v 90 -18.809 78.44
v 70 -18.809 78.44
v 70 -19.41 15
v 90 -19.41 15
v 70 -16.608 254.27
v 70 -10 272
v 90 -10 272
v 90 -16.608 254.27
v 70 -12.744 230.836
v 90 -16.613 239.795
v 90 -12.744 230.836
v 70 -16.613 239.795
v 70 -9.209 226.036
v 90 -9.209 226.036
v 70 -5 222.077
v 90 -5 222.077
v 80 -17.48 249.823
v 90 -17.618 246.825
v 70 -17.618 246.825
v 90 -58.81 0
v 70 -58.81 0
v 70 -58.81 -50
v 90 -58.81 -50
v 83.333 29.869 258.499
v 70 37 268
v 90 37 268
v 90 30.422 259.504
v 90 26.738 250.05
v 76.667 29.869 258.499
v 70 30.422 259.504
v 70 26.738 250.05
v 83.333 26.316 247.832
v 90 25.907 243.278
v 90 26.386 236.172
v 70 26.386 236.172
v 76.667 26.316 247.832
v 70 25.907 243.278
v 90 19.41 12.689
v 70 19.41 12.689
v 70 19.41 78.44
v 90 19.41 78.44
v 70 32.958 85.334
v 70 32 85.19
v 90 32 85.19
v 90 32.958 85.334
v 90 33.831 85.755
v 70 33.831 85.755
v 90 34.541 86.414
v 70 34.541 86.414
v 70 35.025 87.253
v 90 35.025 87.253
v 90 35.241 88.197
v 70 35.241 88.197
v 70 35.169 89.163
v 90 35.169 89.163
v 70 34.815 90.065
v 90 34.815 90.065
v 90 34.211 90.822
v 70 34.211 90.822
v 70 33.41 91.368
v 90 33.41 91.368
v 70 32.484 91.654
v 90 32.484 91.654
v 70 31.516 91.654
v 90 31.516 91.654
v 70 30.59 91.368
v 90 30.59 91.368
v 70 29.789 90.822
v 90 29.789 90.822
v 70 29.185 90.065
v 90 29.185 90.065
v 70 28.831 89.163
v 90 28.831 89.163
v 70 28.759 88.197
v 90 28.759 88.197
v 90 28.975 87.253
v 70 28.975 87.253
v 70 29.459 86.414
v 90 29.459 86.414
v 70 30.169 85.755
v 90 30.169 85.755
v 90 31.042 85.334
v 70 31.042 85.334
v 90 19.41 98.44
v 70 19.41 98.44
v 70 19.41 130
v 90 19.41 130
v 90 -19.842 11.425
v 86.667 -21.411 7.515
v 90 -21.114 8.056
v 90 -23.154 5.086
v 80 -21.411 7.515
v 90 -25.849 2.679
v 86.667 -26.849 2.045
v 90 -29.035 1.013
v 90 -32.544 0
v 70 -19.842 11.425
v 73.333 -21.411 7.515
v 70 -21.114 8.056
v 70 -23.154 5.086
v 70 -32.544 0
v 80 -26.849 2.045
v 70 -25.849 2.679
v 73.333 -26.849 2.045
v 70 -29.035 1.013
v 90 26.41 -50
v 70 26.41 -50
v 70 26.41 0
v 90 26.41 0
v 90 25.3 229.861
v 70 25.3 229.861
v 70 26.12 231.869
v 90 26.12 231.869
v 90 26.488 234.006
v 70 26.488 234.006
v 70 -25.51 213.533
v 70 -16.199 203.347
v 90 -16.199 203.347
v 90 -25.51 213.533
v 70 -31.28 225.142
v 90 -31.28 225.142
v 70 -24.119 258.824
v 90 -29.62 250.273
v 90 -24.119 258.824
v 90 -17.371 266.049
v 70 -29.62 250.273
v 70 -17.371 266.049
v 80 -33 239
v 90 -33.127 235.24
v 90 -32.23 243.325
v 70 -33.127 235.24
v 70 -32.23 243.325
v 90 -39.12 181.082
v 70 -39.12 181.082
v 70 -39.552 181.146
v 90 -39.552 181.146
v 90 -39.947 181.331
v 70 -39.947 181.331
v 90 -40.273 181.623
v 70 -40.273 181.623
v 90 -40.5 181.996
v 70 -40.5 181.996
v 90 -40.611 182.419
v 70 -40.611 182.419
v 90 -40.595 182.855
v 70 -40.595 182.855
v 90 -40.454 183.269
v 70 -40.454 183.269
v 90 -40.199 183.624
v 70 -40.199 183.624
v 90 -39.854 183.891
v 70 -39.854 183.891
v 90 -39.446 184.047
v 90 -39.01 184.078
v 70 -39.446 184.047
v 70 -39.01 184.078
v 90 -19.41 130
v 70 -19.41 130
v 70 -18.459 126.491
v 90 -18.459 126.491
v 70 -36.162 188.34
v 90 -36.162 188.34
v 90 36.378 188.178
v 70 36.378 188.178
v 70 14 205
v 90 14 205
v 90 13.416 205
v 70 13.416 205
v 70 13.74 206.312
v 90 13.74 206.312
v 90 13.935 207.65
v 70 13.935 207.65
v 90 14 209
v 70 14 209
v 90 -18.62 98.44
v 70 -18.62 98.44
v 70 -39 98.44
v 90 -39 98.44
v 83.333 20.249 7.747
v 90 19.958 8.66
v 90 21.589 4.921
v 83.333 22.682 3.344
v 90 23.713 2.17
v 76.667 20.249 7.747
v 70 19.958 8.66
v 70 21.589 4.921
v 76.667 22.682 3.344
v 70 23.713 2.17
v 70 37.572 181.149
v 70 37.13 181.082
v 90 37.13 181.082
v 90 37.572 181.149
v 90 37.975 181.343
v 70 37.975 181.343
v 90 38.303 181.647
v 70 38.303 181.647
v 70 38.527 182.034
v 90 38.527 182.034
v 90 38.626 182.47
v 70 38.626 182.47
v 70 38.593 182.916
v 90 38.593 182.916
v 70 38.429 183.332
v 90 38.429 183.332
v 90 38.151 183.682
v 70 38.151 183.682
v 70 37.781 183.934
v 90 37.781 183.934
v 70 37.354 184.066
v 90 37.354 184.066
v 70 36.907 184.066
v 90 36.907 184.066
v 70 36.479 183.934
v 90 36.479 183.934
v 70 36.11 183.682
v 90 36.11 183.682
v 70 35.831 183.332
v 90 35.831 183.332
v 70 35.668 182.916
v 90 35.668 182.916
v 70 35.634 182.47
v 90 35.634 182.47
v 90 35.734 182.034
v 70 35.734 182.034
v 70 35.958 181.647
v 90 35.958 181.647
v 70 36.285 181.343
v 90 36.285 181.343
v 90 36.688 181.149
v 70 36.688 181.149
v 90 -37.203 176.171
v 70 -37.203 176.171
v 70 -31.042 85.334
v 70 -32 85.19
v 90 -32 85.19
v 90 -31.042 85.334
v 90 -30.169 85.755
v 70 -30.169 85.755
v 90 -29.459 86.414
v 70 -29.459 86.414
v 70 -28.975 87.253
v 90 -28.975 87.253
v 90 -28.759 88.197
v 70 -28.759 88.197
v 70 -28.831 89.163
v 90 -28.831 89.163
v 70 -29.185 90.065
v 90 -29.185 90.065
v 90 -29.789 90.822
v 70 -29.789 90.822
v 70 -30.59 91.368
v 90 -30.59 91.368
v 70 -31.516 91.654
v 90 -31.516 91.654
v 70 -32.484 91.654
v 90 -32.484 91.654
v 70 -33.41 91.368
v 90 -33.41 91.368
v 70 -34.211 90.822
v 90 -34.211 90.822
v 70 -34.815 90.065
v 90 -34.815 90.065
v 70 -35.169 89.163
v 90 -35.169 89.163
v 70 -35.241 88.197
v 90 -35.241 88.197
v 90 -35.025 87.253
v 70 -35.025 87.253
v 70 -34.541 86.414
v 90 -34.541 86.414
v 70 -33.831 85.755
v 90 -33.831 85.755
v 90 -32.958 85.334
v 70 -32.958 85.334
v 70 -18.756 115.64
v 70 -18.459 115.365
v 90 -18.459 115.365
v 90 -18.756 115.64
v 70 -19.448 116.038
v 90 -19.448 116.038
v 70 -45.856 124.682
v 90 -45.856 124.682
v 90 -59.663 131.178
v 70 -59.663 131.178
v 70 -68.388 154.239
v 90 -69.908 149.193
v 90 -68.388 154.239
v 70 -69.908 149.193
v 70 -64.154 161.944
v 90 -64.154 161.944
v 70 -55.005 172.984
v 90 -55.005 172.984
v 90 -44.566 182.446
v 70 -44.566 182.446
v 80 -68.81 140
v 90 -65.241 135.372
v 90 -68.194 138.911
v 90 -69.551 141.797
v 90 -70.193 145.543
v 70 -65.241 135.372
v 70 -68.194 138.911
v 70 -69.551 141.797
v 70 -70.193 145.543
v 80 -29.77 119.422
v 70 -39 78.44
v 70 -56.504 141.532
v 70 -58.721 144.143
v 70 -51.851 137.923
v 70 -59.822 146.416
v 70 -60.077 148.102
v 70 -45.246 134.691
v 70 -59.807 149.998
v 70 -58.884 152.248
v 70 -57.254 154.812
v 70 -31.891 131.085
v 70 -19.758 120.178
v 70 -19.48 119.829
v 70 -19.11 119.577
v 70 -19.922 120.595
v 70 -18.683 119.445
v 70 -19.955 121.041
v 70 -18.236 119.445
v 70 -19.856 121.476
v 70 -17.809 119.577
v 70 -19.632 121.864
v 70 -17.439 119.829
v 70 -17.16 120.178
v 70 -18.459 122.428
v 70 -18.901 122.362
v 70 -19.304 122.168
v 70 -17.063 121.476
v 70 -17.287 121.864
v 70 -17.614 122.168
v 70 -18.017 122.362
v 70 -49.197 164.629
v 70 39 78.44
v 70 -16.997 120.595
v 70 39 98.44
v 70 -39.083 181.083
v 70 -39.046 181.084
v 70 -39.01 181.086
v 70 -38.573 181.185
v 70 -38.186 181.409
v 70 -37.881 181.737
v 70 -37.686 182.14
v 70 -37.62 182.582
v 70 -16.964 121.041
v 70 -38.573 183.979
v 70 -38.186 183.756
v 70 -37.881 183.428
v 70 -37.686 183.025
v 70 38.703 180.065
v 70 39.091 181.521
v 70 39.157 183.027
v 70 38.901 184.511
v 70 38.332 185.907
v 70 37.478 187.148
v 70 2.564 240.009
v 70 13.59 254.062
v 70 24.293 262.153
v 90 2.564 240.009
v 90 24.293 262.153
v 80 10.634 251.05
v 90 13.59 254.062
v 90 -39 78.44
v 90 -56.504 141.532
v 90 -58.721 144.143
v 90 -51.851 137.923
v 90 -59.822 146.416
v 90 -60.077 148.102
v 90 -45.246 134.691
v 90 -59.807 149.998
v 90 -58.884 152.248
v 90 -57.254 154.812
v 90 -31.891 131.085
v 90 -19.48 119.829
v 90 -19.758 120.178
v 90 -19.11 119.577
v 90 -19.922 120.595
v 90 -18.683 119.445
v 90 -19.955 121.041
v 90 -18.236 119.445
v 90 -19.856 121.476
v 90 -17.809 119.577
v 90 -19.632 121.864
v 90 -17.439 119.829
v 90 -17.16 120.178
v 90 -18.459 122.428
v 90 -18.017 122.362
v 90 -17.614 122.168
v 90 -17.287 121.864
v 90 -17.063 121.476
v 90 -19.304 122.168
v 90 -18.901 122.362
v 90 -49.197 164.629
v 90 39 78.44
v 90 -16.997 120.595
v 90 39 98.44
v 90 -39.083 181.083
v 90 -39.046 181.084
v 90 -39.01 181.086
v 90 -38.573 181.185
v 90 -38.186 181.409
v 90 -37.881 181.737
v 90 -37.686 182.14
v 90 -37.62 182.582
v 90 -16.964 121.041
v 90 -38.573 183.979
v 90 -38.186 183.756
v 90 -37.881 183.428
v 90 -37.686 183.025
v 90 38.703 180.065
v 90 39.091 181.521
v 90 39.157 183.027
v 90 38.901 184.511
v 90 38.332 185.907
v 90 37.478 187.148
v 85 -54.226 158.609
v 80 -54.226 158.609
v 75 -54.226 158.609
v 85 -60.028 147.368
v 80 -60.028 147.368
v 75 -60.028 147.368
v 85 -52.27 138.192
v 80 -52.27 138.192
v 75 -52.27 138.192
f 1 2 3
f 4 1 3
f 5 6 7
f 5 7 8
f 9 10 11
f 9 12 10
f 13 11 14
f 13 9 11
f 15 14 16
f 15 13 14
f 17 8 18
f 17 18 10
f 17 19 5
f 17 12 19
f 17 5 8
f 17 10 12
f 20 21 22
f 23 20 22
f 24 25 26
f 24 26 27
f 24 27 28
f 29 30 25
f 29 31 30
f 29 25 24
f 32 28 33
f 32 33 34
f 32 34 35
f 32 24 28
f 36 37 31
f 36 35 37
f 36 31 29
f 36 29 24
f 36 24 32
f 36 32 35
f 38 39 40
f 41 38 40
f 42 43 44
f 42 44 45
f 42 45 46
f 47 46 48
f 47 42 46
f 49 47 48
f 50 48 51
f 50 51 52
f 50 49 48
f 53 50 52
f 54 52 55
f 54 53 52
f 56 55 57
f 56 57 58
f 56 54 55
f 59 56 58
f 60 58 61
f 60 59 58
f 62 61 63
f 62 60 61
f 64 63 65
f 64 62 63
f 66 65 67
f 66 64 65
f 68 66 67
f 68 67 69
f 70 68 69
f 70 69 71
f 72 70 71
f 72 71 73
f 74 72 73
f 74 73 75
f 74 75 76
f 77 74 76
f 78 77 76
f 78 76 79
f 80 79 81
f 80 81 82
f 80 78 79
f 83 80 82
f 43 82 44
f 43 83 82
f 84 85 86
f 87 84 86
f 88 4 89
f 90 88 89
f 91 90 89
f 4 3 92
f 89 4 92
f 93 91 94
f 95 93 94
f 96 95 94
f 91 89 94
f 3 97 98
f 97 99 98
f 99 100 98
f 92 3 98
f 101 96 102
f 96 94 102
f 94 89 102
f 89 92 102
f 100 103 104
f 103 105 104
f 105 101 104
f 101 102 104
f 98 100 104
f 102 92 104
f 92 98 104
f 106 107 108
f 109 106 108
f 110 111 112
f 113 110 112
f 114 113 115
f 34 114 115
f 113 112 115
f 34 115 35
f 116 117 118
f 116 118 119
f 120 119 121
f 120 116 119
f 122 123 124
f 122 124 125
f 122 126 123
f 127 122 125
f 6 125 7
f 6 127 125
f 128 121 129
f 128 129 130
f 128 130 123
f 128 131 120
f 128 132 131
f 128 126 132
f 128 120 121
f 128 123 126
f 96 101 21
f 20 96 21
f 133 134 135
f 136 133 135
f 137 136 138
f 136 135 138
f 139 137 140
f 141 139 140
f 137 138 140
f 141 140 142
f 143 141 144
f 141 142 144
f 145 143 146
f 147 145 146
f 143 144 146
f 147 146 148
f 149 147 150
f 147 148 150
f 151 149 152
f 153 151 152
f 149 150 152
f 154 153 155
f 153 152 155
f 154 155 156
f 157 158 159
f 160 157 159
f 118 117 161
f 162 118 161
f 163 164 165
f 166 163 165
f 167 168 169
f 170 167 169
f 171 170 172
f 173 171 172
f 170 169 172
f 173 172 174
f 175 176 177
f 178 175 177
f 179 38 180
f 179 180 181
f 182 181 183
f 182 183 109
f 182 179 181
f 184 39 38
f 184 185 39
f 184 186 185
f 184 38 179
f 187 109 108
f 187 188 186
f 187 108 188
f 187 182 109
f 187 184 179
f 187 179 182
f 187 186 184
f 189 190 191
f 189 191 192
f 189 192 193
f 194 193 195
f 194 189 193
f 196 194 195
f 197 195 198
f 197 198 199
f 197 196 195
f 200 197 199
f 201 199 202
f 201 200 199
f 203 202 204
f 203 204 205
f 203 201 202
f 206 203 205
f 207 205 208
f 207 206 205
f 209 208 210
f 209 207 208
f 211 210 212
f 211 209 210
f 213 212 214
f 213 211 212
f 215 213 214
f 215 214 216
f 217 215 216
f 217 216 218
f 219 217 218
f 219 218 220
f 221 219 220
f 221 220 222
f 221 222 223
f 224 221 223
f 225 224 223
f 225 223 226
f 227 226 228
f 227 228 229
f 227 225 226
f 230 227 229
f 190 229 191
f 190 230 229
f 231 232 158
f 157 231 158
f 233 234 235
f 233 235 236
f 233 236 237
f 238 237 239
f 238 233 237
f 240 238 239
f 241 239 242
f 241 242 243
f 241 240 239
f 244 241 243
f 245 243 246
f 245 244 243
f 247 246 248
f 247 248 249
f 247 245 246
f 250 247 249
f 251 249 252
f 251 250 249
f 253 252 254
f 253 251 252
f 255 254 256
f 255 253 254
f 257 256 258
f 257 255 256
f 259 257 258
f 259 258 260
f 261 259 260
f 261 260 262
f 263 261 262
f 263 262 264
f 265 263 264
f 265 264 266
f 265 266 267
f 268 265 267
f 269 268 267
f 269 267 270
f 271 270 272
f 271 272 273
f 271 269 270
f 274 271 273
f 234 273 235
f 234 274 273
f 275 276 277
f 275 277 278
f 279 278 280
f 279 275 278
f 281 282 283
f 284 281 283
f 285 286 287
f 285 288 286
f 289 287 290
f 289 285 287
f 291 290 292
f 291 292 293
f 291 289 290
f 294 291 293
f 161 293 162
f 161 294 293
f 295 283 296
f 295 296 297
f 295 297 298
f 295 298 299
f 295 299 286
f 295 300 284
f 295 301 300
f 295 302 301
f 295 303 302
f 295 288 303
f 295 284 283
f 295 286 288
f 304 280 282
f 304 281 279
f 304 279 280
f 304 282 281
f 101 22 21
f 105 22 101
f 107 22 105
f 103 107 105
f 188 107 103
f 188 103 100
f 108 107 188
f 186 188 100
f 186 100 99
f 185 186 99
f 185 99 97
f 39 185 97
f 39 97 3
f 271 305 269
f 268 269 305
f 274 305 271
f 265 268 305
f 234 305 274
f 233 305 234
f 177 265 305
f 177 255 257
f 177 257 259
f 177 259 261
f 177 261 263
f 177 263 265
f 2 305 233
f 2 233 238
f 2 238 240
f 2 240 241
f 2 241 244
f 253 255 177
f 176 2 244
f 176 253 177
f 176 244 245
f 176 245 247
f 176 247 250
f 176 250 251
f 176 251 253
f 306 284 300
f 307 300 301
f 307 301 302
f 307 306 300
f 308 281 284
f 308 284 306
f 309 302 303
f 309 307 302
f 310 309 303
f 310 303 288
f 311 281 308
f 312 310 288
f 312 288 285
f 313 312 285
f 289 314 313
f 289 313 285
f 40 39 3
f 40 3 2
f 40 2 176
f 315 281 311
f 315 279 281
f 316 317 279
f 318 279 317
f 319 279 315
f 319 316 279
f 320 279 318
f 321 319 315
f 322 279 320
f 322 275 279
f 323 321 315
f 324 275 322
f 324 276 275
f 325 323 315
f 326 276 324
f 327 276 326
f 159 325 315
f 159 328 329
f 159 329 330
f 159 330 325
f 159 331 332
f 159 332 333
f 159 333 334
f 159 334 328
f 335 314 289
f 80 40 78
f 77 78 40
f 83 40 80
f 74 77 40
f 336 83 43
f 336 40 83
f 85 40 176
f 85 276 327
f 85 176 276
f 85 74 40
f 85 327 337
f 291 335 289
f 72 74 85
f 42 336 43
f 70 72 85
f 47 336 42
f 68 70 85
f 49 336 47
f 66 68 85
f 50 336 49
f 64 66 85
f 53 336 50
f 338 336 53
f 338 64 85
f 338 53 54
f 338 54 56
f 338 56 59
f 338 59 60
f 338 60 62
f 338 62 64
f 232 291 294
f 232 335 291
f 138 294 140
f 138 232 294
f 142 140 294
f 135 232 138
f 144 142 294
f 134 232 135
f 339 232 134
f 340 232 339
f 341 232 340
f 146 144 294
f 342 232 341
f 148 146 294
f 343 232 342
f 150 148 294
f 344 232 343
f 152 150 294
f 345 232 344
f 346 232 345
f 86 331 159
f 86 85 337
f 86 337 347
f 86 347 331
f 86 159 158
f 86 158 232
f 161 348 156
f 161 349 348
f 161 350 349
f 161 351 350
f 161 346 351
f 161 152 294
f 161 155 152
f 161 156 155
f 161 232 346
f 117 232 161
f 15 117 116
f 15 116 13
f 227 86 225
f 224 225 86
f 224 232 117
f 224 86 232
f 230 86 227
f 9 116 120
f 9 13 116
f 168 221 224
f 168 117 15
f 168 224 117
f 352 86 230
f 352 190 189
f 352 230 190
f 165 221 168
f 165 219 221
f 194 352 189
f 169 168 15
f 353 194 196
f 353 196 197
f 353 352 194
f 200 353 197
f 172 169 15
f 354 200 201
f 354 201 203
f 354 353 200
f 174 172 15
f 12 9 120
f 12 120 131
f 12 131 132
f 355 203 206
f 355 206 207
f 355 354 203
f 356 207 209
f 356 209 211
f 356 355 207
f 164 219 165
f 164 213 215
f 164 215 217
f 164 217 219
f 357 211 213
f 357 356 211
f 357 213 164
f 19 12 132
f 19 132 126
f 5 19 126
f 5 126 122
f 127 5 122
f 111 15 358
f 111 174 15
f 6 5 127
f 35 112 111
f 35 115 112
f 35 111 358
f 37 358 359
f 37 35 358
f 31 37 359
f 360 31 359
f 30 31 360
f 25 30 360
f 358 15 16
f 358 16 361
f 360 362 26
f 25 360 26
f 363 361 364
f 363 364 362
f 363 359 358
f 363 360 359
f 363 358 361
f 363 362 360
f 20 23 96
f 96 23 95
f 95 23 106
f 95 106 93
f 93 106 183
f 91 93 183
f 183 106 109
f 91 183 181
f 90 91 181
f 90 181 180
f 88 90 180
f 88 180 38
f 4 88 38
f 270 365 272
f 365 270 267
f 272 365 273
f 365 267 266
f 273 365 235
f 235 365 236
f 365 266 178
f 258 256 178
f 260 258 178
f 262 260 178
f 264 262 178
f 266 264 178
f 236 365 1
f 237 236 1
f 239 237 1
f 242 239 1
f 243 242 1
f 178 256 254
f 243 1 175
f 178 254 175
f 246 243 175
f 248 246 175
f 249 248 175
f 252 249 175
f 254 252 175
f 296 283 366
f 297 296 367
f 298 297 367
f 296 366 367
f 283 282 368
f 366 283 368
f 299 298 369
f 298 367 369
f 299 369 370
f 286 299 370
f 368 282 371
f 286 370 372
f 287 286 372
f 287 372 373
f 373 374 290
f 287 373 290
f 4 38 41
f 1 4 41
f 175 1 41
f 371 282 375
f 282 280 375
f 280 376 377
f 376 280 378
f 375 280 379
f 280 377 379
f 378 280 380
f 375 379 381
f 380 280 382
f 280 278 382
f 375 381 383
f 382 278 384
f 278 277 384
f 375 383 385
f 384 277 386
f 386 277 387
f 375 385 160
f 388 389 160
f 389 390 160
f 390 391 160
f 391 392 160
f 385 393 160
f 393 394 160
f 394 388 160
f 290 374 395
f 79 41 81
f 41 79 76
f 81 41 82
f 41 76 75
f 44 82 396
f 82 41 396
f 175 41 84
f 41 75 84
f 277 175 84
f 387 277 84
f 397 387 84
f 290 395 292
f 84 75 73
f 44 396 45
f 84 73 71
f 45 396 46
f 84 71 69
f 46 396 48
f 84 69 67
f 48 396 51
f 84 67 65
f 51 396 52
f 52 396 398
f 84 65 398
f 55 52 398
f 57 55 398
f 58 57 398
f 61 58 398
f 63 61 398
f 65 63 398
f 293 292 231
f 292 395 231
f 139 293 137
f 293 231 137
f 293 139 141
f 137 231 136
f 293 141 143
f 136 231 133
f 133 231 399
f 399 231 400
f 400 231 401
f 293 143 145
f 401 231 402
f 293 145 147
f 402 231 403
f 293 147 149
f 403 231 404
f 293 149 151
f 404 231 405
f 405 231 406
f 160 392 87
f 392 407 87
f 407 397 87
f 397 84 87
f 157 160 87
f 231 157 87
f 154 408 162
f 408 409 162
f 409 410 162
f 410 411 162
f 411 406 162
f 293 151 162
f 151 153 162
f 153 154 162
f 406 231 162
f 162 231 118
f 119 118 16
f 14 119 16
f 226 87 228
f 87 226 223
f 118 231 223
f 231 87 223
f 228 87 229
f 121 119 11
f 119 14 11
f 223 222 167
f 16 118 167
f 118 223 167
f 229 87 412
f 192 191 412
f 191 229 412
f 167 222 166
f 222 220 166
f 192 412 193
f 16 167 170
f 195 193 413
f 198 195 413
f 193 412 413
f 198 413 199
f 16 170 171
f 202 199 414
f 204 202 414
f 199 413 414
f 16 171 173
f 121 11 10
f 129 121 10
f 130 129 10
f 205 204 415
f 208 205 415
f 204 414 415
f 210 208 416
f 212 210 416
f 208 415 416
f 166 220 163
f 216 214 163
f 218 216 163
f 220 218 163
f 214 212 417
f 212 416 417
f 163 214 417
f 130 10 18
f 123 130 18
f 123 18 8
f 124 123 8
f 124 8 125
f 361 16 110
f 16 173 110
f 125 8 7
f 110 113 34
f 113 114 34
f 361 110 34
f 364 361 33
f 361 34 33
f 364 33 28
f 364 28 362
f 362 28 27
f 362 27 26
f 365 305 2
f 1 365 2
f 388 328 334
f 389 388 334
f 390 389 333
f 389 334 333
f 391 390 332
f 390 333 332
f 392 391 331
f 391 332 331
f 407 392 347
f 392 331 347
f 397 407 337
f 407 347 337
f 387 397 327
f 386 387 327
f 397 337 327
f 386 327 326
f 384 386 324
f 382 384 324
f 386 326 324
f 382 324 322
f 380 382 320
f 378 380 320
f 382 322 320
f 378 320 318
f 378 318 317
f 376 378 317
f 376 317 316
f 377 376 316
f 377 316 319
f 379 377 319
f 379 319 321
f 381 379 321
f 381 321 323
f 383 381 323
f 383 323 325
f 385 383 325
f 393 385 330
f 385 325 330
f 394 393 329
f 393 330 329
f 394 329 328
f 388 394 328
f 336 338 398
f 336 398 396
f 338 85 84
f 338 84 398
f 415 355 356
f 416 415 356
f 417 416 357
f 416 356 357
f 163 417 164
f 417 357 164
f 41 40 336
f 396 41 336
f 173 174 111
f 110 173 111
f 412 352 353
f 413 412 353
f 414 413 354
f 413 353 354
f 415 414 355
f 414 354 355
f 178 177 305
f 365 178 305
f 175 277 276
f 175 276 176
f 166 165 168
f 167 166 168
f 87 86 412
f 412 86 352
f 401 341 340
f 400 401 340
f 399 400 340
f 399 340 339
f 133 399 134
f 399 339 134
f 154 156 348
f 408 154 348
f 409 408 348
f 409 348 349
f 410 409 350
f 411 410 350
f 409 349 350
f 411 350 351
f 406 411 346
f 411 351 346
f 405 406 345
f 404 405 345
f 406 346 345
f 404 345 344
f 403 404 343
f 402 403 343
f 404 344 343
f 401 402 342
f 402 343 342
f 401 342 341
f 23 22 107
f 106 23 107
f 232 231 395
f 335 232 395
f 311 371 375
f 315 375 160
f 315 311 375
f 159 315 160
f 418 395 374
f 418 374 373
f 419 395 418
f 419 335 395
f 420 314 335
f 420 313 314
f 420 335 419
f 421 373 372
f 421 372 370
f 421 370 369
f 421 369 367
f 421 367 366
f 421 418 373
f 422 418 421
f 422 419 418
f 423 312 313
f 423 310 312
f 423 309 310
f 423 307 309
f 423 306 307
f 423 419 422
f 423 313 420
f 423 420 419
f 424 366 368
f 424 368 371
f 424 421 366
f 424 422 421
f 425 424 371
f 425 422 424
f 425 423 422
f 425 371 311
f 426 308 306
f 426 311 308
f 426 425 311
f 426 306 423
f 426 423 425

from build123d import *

# Parameters (mm, degrees)
SKETCH15_W           = 20
SKETCH15_H           = 19.589999995
SKETCH15_R           = 3.25
SKETCH15_R_2         = 1.5
BOSS_EXTRUDE15_DEPTH = 20


with BuildPart() as part:
    # Sketch15 → Boss-Extrude15 (new body)
    # profile 1 of 9: a face of its own
    with BuildSketch(Plane(origin=(70, 0, 0), x_dir=(0, 0, -1), z_dir=(1, 0, 0))):
        with Locations((-88.44000001, 29.205000003)):
            Rectangle(SKETCH15_W, SKETCH15_H)
        with Locations((-88.44000001, 32)):
            Circle(SKETCH15_R, mode=Mode.SUBTRACT)
    # profile 2 of 9: a face of its own
    with BuildSketch(Plane(origin=(70, 0, 0), x_dir=(0, 0, -1), z_dir=(1, 0, 0))):
        Polygon((-78.44000001, 19.410000005), (-98.44000001, 19.410000005), (-98.44000001, -18.619677344), (-78.44000001, -18.809112305), align=None)
    # profile 3 of 9: a face of its own
    with BuildSketch(Plane(origin=(70, 0, 0), x_dir=(0, 0, -1), z_dir=(1, 0, 0))):
        with BuildLine():
            Line((-98.44000001, -18.619677344), (-98.44000001, 19.410000005))
            Line((-98.44000001, 19.410000005), (-129.999999775, 19.410000005))
            Line((-129.999999775, 19.410000005), (-180.065314543, 38.70335176))
            ThreePointArc((-180.065314543, 38.70335176), (-182.272264238, 39.16469668), (-184.511391341, 38.900545379))
            ThreePointArc((-184.511391341, 38.900545379), (-186.550399309, 37.938302132), (-188.177753017, 36.377794049))
            Line((-188.177753017, 36.377794049), (-205, 14))
            Line((-205, 14), (-205, 13.416407865))
            ThreePointArc((-205, 13.416407865), (-197.77502784, 8.366600265), (-195, 0))
            ThreePointArc((-195, 0), (-197.77502784, -8.366600265), (-205, -13.416407865))
            Line((-205, -13.416407865), (-205, -14))
            Line((-205, -14), (-203.346653557, -16.199364106))
            Line((-203.346653557, -16.199364106), (-188.339722055, -36.162334737))
            Line((-188.339722055, -36.162334737), (-188.177753017, -36.377794049))
            ThreePointArc((-188.177753017, -36.377794049), (-186.364430041, -38.06193991), (-184.078396039, -39.009851321))
            ThreePointArc((-184.078396039, -39.009851321), (-182.582425277, -37.619721199), (-181.08645446, -39.009851262))
            ThreePointArc((-181.08645446, -39.009851262), (-180.570040891, -38.87607057), (-180.065314768, -38.703351755))
            Line((-180.065314768, -38.703351755), (-176.171363895, -37.202764687))
            Line((-176.171363895, -37.202764687), (-130, -19.41))
            Line((-130, -19.41), (-126.491444941, -18.459363472))
            Line((-126.491444941, -18.459363472), (-122.428461685, -18.459363472))
            ThreePointArc((-122.428461685, -18.459363472), (-120.928461684, -16.959363475), (-119.428461685, -18.459363475))
            Line((-119.428461685, -18.459363477), (-115.365478429, -18.459363477))
            Line((-115.365478429, -18.459363477), (-98.44000001, -18.619677344))
        make_face()
        with Locations((-182.582425247, 37.130278801)):
            Circle(SKETCH15_R_2, mode=Mode.SUBTRACT)
    # profile 4 of 9: a face of its own
    with BuildSketch(Plane(origin=(70, 0, 0), x_dir=(0, 0, -1), z_dir=(1, 0, 0))):
        Polygon((-78.44000001, -18.809112305), (-98.44000001, -18.619677344), (-98.44000001, -39), (-78.44000001, -39), align=None)
        with Locations((-88.44000001, -32)):
            Circle(SKETCH15_R, mode=Mode.SUBTRACT)
    # profile 5 of 9: a face of its own
    with BuildSketch(Plane(origin=(70, 0, 0), x_dir=(0, 0, -1), z_dir=(1, 0, 0))):
        with BuildLine():
            Line((-12.688577312, 19.410000005), (-78.44000001, 19.410000005))
            Line((-78.44000001, 19.410000005), (-78.44000001, -18.809112305))
            Line((-78.44000001, -18.809112305), (-15, -19.41))
            add(Edge.make_bspline(
                [(-15, -19.41), (-13.249547591, -19.408181615), (-10.636542877, -19.873423975), (-7.227483858, -21.463217214), (-4.430660235, -23.529969815), (-1.938135904, -26.620123221), (-0.647154722, -29.848037608), (-0.151937094, -31.836563519), (-1e-08, -32.543888031)],
                knots=[0, 0, 0, 0, 0.092790772, 0.138362295, 0.198534542, 0.275880543, 0.345017918, 0.382436923, 0.382436923, 0.382436923, 0.382436923], degree=3))
            Line((-1e-08, -32.543888031), (-1e-08, -58.810000307))
            Line((-1e-08, -58.810000307), (49.99999999, -58.810000307))
            Line((49.99999999, -58.810000307), (49.99999999, 26.409999693))
            Line((49.99999999, 26.409999693), (-2.31e-07, 26.409999693))
            add(Edge.make_bspline(
                [(-12.688577312, 19.410000005), (-7.650038915, 19.35149242), (-2.642112225, 22.134845248), (-2.31e-07, 26.409999693)],
                knots=[0, 0, 0, 0, 1, 1, 1, 1], degree=3))
        make_face()
    # profile 6 of 9: a face of its own
    with BuildSketch(Plane(origin=(70, 0, 0), x_dir=(0, 0, -1), z_dir=(1, 0, 0))):
        with BuildLine():
            add(Edge.make_bspline(
                [(-115.365478429, -18.459363477), (-118.337689795, -20.667625344), (-132.142409229, -105.183313139), (-182.50008697, -46.527893183), (-188.339722067, -36.162334746)],
                knots=[0.032689724, 0.032689724, 0.032689724, 0.032689724, 0.488322638, 0.982304333, 0.982304333, 0.982304333, 0.982304333], degree=3))
            Line((-115.365478429, -18.459363477), (-119.428461685, -18.459363477))
            ThreePointArc((-119.428461685, -18.459363475), (-120.928461687, -19.959363475), (-122.428461685, -18.459363472))
            Line((-122.428461685, -18.459363472), (-126.491444941, -18.459363472))
            add(Edge.make_bspline(
                [(-176.171363894, -37.20276469), (-171.139612123, -44.049971955), (-162.799958037, -50.611377733), (-148.082213467, -63.100400251), (-130.811998287, -46.574461422), (-132.676351157, -30.352203006), (-126.491444941, -18.459363472)],
                knots=[0.060690419, 0.060690419, 0.060690419, 0.060690419, 0.334246994, 0.47319649, 0.580462847, 0.999065803, 0.999065803, 0.999065803, 0.999065803], degree=3))
            Line((-176.171363895, -37.202764687), (-180.065314768, -38.703351755))
            ThreePointArc((-180.065314768, -38.703351755), (-180.570040891, -38.87607057), (-181.08645446, -39.009851262))
            ThreePointArc((-181.08645446, -39.009851262), (-181.083432889, -39.064749303), (-181.082425247, -39.119721199))
            ThreePointArc((-181.082425247, -39.119721199), (-182.637397114, -40.618713559), (-184.078396039, -39.009851321))
            ThreePointArc((-184.078396039, -39.009851321), (-186.364430041, -38.06193991), (-188.177753017, -36.377794049))
            Line((-188.177753017, -36.377794049), (-188.339722055, -36.162334737))
        make_face()
    # profile 7 of 9: a face of its own
    with BuildSketch(Plane(origin=(70, 0, 0), x_dir=(0, 0, -1), z_dir=(1, 0, 0))):
        with BuildLine():
            add(Edge.make_bspline(
                [(-203.346653557, -16.199364106), (-211.226597536, -26.08083046), (-240.341367609, -42.642056022), (-264.544843043, -20.588986196), (-272, -10)],
                knots=[0, 0, 0, 0, 0.497870866, 1, 1, 1, 1], degree=3))
            Line((-203.346653557, -16.199364106), (-205, -14))
            Line((-205, -14), (-205, -13.416407865))
            ThreePointArc((-205, -13.416407865), (-215.189150723, -12.557643621), (-222.076696831, -5))
            add(Edge.make_bspline(
                [(-272, -10), (-264.545129876, -12.082948955), (-248.030952015, -22.766414555), (-228.235082791, -13.000064926), (-222.076696831, -5)],
                knots=[0, 0, 0, 0, 0.427590857, 1, 1, 1, 1], degree=3))
        make_face()
    # profile 8 of 9: a face of its own
    with BuildSketch(Plane(origin=(70, 0, 0), x_dir=(0, 0, -1), z_dir=(1, 0, 0))):
        with BuildLine():
            ThreePointArc((-222.076696831, -5), (-215.189150723, -12.557643621), (-205, -13.416407865))
            ThreePointArc((-205, -13.416407865), (-197.77502784, -8.366600265), (-195, 0))
            ThreePointArc((-195, 0), (-197.77502784, 8.366600265), (-205, 13.416407865))
            ThreePointArc((-205, 13.416407865), (-206.97882585, 13.853333716), (-209, 14))
            ThreePointArc((-209, 14), (-220.532562595, 7.937253933), (-222.076696831, -5))
        make_face()
    # profile 9 of 9: a face of its own
    with BuildSketch(Plane(origin=(70, 0, 0), x_dir=(0, 0, -1), z_dir=(1, 0, 0))):
        with BuildLine():
            add(Edge.make_bspline(
                [(-222.076696831, -5), (-257.061665042, 5.267819927), (-268, 37)],
                knots=[0, 0, 0, 1, 1, 1], degree=2))
            ThreePointArc((-222.076696831, -5), (-220.532562595, 7.937253933), (-209, 14))
            Line((-209, 14), (-229.860874802, 25.299640518))
            ThreePointArc((-229.860874802, 25.299640518), (-232.927225248, 26.361767888), (-236.172225659, 26.386097743))
            add(Edge.make_bspline(
                [(-268, 37), (-259.138798147, 28.095153636), (-248.271123635, 24.489684832), (-236.172225659, 26.386097743)],
                knots=[0, 0, 0, 0, 0.92040658, 0.92040658, 0.92040658, 0.92040658], degree=3))
        make_face()
    extrude(amount=BOSS_EXTRUDE15_DEPTH)


solid = part.part
